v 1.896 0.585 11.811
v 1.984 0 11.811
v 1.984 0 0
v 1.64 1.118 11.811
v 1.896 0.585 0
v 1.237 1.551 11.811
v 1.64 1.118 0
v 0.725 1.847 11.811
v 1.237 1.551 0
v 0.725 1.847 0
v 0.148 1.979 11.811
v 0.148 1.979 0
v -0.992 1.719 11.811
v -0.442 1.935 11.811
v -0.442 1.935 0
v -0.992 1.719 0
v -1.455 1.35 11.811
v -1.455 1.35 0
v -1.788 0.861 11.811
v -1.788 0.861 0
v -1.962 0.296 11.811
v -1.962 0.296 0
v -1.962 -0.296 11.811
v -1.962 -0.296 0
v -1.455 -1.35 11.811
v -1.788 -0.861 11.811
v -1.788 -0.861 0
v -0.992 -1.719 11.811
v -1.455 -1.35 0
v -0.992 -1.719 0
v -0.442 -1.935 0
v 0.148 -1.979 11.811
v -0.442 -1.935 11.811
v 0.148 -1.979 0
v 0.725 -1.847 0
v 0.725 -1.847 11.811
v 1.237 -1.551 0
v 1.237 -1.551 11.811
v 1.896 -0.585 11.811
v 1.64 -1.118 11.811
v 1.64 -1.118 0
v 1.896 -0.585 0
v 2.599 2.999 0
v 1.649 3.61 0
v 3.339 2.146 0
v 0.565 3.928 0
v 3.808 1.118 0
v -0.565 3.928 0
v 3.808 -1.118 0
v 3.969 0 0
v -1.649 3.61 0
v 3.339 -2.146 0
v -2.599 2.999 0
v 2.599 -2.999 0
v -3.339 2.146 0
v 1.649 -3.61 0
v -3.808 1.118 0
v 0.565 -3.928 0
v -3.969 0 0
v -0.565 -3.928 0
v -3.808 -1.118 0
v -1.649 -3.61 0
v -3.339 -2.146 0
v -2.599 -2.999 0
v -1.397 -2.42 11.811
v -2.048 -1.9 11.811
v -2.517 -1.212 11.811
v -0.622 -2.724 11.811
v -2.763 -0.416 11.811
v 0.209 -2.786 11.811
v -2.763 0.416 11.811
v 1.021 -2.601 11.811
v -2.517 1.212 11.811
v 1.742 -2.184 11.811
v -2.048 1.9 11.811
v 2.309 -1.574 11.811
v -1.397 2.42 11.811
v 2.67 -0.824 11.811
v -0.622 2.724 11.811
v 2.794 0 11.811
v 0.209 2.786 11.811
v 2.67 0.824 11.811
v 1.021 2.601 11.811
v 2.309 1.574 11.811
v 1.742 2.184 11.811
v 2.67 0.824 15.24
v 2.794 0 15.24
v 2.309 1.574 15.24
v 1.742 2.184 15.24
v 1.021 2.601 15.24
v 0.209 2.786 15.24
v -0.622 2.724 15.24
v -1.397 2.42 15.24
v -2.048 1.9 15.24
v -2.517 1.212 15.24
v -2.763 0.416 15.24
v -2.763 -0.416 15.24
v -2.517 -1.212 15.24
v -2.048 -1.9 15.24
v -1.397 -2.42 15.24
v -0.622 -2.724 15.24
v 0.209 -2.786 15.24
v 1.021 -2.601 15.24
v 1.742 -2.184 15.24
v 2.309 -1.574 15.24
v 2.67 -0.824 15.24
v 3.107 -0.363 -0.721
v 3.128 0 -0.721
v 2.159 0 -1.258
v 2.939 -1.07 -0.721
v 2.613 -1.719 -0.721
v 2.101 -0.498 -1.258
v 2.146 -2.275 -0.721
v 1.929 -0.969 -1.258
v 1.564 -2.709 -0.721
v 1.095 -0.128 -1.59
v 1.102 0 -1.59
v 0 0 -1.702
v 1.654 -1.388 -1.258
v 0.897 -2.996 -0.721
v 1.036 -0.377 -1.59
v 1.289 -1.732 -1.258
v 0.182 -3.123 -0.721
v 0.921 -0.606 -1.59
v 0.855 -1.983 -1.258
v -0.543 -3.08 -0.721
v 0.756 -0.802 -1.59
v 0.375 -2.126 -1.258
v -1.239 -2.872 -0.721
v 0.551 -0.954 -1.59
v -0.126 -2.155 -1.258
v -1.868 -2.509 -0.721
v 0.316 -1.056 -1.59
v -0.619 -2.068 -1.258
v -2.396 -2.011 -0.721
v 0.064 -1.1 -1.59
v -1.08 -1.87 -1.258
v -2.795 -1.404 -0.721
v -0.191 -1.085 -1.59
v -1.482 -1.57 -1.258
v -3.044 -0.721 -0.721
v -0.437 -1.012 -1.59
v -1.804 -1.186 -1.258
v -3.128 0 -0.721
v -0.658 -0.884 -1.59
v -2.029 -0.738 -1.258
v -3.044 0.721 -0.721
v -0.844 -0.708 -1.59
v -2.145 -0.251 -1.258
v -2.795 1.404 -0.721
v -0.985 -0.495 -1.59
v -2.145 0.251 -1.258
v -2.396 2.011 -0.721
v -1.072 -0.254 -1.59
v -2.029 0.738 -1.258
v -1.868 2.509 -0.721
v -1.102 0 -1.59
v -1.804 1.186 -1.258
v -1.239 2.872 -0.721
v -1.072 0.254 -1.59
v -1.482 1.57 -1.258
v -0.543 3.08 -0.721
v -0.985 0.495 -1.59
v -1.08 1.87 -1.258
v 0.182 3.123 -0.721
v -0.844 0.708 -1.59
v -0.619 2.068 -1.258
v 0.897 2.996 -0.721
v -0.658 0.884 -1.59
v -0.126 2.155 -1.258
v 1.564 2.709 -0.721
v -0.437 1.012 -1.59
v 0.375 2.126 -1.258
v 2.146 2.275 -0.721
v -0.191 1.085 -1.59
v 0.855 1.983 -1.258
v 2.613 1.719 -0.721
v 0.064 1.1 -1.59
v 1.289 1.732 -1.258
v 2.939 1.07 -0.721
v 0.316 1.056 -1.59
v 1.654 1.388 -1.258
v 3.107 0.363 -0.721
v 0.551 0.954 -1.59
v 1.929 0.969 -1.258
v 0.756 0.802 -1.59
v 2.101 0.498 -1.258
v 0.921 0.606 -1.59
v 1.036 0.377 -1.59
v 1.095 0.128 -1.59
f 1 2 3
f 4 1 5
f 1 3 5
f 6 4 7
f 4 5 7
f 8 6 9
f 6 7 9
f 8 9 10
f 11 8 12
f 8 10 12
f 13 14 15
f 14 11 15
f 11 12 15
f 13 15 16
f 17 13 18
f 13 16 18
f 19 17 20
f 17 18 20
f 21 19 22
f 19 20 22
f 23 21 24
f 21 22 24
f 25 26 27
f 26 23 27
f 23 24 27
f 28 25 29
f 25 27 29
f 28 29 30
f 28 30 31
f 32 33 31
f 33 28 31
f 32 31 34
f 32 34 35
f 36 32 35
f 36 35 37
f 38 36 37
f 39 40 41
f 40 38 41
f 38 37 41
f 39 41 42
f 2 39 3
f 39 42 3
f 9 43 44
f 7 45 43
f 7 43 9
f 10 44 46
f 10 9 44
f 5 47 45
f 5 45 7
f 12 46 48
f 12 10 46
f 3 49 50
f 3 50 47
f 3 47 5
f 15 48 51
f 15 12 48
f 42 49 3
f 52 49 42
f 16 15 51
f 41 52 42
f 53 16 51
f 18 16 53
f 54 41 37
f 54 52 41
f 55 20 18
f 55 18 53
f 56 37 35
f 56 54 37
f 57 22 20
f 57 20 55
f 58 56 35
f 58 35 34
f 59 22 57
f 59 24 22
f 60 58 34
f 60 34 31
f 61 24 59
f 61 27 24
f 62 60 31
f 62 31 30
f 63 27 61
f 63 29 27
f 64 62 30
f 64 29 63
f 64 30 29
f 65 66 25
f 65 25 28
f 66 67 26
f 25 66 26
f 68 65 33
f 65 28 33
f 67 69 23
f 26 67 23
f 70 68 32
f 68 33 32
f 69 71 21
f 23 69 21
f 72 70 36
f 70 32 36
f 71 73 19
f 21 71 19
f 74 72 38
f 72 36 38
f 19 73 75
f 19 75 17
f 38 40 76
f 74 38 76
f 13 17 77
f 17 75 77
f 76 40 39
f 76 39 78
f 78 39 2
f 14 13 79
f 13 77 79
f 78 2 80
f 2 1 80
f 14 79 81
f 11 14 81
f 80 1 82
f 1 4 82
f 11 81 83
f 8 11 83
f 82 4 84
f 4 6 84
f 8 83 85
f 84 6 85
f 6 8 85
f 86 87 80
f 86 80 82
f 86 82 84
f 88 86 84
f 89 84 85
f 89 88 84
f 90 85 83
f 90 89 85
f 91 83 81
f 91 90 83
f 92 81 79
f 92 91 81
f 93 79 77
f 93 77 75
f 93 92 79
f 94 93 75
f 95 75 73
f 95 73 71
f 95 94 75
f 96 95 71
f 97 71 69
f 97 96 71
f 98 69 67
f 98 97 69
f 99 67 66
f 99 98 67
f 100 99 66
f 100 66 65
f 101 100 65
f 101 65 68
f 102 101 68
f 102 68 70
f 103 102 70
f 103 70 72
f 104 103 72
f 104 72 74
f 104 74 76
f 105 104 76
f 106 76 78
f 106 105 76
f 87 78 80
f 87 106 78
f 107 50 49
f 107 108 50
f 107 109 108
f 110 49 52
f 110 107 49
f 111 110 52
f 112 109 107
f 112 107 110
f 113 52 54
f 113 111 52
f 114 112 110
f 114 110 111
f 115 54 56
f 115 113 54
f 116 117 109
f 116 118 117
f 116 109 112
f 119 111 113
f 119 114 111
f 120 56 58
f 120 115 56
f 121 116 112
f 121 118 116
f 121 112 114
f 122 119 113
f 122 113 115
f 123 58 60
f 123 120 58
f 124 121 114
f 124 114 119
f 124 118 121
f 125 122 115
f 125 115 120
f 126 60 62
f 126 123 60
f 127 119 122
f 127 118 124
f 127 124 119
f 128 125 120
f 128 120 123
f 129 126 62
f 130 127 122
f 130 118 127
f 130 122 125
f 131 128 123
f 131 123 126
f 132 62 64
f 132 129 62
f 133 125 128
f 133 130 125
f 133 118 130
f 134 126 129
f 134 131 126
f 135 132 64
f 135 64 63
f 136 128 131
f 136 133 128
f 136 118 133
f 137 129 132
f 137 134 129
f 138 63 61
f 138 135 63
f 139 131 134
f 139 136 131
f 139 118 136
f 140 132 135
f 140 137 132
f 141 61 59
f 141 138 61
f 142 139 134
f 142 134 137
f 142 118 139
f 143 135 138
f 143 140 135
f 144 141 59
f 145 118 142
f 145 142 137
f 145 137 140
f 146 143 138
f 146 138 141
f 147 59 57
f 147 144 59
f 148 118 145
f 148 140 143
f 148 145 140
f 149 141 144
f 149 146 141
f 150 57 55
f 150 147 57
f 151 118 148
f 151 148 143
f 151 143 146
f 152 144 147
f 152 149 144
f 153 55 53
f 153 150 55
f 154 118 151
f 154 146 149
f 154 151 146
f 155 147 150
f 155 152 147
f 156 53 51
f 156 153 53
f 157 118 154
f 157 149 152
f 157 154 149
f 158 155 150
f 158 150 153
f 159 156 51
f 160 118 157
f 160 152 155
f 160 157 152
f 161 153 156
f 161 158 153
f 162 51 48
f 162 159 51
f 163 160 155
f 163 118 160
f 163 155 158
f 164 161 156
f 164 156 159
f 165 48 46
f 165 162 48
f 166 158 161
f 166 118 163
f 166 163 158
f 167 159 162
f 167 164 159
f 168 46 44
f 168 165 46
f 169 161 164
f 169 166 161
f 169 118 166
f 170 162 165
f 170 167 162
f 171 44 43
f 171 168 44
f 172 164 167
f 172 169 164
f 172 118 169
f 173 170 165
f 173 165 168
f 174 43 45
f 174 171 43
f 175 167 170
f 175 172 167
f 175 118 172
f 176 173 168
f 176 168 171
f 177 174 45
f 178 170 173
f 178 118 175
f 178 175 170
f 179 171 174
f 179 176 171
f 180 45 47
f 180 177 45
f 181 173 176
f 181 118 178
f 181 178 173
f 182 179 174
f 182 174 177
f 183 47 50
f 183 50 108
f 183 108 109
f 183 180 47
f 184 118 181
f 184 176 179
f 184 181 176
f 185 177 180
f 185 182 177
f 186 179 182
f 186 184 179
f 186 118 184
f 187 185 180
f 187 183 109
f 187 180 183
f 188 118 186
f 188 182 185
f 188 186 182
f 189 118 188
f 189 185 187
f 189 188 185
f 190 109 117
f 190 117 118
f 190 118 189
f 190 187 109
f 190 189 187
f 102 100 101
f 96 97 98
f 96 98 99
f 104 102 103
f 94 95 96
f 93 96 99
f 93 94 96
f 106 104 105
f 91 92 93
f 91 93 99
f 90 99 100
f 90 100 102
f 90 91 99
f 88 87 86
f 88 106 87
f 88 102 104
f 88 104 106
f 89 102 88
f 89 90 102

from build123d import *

# Parameters (mm, degrees)
SKETCH1_R          = 1.984375
BASE_EXTRUDE_DEPTH = 15.24
SKETCH3_R          = 2.794
EXTRUDE1_DEPTH     = 3.429


with BuildPart() as part:
    # Sketch1 → Base-Extrude (new body)
    with BuildSketch(Plane.XY):
        Circle(SKETCH1_R)
    extrude(amount=BASE_EXTRUDE_DEPTH)

    # Sketch2 → Boss-Revolve1 (revolve)
    with BuildSketch(Plane(origin=(0, 0, 0), x_dir=(1, 0, 0), z_dir=(0, 1, 0))):
        with BuildLine():
            Line((0, 1.7018), (0, 0))
            Line((0, 0), (3.96875, 0))
            ThreePointArc((3.96875, 0), (2.15911439, 1.258407907), (0, 1.7018))
        make_face()
    revolve(axis=Axis((0, 0, 0), (0, 0, -1)))

    # Sketch3 → Extrude1 (add)
    with BuildSketch(Plane.XY.offset(15.24)):
        Circle(SKETCH3_R)
    extrude(amount=-EXTRUDE1_DEPTH)


solid = part.part
